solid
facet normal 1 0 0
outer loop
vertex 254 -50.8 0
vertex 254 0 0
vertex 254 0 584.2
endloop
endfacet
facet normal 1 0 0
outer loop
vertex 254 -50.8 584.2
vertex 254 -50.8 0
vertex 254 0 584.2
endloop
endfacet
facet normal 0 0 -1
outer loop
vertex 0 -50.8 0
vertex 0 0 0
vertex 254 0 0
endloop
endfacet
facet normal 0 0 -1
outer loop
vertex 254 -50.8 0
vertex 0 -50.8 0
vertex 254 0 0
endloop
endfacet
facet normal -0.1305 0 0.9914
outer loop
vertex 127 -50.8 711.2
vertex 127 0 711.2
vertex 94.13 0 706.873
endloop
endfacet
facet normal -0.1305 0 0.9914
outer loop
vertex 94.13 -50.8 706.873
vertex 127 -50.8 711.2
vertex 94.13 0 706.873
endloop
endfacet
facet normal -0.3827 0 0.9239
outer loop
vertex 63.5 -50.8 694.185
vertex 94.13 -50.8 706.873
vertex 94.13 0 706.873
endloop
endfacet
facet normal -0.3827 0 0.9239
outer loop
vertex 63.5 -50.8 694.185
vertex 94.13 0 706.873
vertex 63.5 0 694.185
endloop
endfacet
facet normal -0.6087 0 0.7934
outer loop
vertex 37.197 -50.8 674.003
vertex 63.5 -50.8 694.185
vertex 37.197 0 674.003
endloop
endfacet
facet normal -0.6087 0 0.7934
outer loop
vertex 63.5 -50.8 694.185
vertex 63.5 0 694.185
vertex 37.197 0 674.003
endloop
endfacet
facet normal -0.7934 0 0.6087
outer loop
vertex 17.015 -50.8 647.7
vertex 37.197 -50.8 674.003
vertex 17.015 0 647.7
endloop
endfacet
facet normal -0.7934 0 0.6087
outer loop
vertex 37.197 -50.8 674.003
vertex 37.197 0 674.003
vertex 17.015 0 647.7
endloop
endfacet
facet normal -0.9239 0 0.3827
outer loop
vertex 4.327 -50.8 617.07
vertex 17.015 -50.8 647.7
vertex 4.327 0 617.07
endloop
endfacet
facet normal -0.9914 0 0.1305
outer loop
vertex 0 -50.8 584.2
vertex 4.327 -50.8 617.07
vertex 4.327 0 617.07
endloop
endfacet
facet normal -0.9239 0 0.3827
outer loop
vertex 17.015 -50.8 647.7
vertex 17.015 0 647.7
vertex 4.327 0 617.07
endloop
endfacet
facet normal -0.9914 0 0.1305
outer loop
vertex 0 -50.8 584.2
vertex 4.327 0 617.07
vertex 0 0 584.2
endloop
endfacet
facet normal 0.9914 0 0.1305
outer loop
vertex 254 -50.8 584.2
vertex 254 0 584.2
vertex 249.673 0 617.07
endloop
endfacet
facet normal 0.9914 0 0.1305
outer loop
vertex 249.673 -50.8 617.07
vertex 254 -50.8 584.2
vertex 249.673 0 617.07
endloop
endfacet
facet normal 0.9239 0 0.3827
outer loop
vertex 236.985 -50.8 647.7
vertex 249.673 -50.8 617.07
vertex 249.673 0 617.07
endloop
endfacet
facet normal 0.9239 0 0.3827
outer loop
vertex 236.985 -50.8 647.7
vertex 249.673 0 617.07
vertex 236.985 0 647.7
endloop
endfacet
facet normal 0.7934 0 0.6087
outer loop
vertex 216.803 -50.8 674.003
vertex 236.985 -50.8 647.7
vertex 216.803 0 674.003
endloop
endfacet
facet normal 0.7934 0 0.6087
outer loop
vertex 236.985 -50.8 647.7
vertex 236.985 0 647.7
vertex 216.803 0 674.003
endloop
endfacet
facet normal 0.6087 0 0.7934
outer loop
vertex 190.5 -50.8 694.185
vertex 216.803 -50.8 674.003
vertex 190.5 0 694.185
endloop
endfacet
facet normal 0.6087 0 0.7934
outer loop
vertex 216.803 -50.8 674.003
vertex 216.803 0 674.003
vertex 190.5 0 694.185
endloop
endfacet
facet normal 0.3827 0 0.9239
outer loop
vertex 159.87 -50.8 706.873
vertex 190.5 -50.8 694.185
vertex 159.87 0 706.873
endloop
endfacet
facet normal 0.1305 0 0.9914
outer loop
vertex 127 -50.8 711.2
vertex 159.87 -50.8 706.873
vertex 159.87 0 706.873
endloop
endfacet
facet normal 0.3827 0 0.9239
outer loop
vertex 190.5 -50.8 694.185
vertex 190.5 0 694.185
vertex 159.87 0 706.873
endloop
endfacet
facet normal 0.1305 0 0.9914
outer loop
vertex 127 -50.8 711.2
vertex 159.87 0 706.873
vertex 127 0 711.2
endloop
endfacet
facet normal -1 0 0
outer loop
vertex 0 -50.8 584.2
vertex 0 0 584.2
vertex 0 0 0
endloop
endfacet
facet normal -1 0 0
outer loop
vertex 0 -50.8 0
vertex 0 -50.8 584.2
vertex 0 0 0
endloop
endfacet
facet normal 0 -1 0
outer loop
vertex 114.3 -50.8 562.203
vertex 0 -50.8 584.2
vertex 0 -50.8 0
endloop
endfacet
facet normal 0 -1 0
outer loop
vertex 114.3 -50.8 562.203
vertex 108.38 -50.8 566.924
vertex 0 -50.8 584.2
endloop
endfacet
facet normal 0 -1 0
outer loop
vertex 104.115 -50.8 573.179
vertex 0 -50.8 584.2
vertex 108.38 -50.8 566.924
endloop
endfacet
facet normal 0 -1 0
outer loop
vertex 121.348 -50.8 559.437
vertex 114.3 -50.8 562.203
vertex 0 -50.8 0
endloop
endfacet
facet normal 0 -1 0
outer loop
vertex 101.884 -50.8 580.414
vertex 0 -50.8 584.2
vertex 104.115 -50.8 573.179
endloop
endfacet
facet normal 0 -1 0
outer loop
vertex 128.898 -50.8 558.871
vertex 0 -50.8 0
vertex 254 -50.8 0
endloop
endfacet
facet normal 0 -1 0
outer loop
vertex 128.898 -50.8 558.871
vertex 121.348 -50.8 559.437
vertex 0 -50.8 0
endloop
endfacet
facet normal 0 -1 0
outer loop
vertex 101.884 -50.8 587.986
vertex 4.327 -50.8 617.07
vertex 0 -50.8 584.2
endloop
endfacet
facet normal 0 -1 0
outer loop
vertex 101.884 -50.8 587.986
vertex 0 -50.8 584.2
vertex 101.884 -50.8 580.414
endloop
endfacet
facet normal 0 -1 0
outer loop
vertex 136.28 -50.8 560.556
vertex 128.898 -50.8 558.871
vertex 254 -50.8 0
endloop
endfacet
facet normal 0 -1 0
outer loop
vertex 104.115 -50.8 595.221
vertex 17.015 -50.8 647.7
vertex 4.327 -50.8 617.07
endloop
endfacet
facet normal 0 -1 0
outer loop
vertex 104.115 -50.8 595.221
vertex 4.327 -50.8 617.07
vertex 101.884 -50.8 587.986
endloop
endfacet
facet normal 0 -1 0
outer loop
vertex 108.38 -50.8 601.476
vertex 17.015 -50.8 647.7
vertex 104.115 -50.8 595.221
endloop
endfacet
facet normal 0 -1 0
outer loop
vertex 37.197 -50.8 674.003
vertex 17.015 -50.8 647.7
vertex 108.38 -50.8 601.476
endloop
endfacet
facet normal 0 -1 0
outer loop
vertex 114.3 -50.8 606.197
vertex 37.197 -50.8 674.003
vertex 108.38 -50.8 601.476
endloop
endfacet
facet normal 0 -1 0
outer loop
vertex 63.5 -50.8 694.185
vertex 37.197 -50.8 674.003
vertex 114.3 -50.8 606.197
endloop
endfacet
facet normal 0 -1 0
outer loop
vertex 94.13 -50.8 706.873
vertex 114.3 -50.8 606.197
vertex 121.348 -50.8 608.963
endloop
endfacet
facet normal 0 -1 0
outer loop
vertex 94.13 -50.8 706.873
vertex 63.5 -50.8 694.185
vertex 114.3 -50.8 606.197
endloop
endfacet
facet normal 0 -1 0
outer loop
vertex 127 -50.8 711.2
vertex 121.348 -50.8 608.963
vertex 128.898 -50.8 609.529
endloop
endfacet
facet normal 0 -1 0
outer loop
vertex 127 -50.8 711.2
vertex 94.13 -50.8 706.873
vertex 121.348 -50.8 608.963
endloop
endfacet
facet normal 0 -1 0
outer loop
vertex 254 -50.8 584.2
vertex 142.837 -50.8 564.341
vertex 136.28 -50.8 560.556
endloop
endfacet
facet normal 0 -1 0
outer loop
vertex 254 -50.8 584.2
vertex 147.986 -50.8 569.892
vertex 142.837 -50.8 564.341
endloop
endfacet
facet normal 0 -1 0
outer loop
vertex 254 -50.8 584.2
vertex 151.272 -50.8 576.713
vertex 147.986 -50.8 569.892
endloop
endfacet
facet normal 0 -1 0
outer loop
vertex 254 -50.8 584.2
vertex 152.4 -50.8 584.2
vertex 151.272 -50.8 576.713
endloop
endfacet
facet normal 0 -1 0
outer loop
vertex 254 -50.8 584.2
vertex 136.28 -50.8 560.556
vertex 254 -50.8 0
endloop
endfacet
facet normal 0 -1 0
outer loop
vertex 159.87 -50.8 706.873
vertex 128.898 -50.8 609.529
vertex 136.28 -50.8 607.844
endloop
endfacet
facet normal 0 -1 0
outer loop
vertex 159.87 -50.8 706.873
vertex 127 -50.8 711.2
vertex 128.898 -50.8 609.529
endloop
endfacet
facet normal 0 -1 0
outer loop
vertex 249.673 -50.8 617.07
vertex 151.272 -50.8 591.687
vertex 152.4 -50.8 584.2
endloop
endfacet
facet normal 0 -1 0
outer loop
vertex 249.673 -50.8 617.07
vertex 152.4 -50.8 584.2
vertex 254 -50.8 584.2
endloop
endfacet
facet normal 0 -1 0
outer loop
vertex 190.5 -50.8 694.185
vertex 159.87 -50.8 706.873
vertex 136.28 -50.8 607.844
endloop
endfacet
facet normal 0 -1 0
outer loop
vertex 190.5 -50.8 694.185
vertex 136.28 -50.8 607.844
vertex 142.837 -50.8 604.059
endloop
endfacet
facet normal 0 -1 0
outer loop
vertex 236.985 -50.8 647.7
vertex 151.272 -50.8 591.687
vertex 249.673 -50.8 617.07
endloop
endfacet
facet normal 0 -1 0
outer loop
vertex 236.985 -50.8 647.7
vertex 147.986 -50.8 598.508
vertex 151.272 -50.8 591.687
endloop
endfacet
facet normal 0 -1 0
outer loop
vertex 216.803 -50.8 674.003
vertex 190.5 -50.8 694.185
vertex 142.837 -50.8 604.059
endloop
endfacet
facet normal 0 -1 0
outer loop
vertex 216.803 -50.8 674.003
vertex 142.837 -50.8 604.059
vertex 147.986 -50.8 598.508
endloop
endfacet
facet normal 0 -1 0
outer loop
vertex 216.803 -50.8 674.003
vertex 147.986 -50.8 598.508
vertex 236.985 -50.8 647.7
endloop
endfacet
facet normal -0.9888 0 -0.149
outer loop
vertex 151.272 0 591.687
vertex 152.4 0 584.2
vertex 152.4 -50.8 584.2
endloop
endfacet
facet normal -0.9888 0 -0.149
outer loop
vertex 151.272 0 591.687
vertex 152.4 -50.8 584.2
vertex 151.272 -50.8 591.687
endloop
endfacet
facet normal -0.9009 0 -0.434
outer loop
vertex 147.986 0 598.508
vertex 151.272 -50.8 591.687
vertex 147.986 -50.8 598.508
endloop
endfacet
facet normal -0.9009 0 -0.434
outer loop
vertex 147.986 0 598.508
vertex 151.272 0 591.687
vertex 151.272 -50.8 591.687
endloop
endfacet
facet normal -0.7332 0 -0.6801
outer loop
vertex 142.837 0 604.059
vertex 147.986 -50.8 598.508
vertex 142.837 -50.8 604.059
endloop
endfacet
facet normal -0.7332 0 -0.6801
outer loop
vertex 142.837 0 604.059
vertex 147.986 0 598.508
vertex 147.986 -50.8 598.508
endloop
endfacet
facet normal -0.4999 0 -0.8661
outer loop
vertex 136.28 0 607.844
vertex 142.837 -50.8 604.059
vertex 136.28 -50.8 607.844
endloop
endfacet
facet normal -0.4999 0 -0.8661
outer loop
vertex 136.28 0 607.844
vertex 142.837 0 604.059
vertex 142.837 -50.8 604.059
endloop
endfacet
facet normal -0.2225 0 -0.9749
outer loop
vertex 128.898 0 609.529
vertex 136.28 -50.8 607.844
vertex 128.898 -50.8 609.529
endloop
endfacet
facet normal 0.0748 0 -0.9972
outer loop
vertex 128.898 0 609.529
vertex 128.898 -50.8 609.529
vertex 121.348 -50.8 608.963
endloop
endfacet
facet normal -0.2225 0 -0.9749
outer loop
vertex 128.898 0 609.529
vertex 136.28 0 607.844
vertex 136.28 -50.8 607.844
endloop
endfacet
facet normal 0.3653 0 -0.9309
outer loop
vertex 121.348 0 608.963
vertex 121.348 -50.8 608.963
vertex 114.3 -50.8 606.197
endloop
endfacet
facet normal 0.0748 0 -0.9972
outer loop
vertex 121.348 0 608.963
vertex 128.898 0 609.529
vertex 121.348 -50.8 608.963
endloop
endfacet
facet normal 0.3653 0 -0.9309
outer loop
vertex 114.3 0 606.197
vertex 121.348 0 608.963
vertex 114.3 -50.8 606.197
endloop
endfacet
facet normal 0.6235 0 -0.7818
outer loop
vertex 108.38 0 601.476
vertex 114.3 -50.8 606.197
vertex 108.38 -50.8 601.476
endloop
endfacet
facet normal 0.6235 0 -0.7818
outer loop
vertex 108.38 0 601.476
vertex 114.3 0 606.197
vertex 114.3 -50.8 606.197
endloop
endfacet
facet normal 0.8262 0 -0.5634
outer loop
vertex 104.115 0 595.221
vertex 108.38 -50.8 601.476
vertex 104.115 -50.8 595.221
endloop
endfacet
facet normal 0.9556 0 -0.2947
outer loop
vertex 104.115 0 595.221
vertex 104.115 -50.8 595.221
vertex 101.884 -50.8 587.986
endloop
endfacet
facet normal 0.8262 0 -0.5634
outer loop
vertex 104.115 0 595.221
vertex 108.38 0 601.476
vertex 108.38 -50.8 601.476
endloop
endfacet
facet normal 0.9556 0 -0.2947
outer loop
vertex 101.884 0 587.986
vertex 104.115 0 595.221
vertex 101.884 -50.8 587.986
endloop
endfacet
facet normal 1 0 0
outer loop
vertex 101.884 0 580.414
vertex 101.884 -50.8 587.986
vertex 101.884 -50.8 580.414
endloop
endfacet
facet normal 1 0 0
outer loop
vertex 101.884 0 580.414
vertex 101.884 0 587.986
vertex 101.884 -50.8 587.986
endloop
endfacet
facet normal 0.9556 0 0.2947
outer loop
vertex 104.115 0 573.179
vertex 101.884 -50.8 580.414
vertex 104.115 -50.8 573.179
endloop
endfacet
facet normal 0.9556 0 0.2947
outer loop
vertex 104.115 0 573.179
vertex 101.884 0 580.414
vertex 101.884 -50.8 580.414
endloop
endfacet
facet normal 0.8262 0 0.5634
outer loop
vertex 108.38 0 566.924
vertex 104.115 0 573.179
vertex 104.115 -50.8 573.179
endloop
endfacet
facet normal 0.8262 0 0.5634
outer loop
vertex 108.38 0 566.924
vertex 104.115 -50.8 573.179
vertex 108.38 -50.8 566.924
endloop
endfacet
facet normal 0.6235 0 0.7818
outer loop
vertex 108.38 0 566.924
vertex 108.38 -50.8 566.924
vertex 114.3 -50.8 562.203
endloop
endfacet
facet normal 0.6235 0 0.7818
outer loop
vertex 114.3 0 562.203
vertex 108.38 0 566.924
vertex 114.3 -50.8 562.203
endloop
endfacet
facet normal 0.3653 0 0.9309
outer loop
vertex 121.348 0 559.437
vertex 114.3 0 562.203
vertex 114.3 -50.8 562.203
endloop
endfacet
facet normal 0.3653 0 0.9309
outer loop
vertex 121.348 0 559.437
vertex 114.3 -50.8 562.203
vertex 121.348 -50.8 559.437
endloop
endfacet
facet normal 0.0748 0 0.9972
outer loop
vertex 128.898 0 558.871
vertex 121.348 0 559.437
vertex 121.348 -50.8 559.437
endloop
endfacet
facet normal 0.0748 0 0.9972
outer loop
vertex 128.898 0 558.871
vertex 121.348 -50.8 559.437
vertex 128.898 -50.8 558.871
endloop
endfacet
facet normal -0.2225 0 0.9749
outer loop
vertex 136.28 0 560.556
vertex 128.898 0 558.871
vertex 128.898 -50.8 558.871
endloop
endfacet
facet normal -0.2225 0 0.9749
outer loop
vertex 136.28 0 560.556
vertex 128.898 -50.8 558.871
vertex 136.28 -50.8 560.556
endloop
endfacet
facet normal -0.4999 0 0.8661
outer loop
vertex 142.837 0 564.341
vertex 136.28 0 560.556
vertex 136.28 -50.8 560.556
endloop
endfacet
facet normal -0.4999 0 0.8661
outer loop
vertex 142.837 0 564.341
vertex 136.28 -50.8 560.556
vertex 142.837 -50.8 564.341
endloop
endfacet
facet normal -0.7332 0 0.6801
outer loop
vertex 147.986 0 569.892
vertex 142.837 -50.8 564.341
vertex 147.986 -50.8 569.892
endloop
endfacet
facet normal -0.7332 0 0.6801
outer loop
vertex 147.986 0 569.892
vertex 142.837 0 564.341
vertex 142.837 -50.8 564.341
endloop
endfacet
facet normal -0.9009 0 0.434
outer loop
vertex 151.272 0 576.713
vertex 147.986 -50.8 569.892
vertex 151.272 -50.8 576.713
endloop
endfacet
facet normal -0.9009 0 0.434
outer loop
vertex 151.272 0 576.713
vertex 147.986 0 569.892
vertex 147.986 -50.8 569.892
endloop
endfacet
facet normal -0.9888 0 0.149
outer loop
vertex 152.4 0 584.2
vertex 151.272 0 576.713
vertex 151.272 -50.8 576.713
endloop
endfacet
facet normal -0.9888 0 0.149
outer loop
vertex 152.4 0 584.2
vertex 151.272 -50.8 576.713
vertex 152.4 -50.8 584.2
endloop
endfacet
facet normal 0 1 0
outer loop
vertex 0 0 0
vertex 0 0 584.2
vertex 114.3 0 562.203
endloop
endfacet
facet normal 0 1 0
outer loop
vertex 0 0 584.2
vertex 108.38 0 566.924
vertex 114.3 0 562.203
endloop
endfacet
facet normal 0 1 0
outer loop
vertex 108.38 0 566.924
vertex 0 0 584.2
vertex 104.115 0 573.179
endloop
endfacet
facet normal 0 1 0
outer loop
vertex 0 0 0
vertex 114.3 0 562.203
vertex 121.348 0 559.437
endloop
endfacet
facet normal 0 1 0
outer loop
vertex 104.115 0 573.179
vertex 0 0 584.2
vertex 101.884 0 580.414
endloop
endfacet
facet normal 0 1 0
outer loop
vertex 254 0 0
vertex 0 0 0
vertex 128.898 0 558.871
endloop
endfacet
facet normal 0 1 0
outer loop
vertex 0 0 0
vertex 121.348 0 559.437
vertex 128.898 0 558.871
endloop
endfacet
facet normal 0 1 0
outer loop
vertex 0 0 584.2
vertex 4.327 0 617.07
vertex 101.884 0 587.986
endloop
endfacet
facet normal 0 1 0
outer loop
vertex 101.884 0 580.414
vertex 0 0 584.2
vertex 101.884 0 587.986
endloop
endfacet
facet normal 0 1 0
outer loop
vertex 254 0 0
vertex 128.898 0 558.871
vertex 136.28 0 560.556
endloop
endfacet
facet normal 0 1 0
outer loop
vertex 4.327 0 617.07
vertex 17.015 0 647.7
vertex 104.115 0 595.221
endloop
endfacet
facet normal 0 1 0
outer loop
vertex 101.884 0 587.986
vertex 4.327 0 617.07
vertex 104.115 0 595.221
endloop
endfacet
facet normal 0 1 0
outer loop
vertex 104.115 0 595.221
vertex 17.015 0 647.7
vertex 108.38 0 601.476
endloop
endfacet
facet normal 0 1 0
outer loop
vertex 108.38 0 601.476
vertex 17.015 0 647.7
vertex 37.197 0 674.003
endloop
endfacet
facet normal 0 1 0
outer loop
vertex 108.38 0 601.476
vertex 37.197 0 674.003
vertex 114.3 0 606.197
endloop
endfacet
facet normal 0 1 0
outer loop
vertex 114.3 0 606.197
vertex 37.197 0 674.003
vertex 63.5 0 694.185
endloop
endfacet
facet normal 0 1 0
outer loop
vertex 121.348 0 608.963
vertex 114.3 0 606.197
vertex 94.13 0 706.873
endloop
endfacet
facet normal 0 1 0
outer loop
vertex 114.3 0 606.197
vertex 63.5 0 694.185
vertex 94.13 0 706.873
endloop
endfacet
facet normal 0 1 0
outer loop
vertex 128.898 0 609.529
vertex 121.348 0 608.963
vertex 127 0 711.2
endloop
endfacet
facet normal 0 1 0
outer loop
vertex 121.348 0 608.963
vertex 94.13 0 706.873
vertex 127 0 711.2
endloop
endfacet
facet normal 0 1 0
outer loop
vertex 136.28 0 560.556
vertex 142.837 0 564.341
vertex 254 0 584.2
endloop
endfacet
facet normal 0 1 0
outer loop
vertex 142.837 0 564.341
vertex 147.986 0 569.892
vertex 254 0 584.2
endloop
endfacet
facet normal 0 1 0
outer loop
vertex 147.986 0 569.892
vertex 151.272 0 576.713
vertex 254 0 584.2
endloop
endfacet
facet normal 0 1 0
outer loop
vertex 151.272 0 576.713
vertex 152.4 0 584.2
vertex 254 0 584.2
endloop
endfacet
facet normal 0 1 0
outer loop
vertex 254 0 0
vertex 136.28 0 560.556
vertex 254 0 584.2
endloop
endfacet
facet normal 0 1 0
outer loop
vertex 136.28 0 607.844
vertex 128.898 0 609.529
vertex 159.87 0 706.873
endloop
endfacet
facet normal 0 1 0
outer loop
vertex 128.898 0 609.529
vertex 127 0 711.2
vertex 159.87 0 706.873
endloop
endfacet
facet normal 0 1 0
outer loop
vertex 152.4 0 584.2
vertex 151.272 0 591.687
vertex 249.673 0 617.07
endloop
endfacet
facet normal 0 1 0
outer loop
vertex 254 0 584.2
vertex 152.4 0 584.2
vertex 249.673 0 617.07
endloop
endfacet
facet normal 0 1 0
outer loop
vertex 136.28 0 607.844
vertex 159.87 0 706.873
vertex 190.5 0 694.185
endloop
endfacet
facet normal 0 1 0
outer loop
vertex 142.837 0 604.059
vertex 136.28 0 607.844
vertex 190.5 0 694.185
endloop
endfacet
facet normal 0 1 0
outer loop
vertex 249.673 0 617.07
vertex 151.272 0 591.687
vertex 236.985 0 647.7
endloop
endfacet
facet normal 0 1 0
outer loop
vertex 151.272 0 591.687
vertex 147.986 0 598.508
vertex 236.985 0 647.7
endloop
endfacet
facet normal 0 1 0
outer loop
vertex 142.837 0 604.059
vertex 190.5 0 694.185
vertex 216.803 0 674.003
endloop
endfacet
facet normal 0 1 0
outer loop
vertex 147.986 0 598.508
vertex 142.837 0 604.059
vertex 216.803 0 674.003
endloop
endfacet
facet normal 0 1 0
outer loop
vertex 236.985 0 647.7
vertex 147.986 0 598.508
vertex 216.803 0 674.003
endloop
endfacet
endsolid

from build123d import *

# Parameters (mm, degrees)
F0_R     = 25.4
F1_DEPTH = 50.8


with BuildPart() as f1:
    # F0 (on Front) → F1 (new body)
    with BuildSketch(Plane.XZ):
        with BuildLine():
            Line((0, 584.2), (0, 0))
            Line((0, 0), (254, 0))
            Line((254, 0), (254, 584.2))
            ThreePointArc((254, 584.2), (216.802561, 674.002561), (127, 711.2))
            ThreePointArc((127, 711.2), (37.197439, 674.002561), (0, 584.2))
        make_face()
        with Locations((127, 584.2)):
            Circle(F0_R, mode=Mode.SUBTRACT)
    extrude(amount=F1_DEPTH)


solid = f1.part
